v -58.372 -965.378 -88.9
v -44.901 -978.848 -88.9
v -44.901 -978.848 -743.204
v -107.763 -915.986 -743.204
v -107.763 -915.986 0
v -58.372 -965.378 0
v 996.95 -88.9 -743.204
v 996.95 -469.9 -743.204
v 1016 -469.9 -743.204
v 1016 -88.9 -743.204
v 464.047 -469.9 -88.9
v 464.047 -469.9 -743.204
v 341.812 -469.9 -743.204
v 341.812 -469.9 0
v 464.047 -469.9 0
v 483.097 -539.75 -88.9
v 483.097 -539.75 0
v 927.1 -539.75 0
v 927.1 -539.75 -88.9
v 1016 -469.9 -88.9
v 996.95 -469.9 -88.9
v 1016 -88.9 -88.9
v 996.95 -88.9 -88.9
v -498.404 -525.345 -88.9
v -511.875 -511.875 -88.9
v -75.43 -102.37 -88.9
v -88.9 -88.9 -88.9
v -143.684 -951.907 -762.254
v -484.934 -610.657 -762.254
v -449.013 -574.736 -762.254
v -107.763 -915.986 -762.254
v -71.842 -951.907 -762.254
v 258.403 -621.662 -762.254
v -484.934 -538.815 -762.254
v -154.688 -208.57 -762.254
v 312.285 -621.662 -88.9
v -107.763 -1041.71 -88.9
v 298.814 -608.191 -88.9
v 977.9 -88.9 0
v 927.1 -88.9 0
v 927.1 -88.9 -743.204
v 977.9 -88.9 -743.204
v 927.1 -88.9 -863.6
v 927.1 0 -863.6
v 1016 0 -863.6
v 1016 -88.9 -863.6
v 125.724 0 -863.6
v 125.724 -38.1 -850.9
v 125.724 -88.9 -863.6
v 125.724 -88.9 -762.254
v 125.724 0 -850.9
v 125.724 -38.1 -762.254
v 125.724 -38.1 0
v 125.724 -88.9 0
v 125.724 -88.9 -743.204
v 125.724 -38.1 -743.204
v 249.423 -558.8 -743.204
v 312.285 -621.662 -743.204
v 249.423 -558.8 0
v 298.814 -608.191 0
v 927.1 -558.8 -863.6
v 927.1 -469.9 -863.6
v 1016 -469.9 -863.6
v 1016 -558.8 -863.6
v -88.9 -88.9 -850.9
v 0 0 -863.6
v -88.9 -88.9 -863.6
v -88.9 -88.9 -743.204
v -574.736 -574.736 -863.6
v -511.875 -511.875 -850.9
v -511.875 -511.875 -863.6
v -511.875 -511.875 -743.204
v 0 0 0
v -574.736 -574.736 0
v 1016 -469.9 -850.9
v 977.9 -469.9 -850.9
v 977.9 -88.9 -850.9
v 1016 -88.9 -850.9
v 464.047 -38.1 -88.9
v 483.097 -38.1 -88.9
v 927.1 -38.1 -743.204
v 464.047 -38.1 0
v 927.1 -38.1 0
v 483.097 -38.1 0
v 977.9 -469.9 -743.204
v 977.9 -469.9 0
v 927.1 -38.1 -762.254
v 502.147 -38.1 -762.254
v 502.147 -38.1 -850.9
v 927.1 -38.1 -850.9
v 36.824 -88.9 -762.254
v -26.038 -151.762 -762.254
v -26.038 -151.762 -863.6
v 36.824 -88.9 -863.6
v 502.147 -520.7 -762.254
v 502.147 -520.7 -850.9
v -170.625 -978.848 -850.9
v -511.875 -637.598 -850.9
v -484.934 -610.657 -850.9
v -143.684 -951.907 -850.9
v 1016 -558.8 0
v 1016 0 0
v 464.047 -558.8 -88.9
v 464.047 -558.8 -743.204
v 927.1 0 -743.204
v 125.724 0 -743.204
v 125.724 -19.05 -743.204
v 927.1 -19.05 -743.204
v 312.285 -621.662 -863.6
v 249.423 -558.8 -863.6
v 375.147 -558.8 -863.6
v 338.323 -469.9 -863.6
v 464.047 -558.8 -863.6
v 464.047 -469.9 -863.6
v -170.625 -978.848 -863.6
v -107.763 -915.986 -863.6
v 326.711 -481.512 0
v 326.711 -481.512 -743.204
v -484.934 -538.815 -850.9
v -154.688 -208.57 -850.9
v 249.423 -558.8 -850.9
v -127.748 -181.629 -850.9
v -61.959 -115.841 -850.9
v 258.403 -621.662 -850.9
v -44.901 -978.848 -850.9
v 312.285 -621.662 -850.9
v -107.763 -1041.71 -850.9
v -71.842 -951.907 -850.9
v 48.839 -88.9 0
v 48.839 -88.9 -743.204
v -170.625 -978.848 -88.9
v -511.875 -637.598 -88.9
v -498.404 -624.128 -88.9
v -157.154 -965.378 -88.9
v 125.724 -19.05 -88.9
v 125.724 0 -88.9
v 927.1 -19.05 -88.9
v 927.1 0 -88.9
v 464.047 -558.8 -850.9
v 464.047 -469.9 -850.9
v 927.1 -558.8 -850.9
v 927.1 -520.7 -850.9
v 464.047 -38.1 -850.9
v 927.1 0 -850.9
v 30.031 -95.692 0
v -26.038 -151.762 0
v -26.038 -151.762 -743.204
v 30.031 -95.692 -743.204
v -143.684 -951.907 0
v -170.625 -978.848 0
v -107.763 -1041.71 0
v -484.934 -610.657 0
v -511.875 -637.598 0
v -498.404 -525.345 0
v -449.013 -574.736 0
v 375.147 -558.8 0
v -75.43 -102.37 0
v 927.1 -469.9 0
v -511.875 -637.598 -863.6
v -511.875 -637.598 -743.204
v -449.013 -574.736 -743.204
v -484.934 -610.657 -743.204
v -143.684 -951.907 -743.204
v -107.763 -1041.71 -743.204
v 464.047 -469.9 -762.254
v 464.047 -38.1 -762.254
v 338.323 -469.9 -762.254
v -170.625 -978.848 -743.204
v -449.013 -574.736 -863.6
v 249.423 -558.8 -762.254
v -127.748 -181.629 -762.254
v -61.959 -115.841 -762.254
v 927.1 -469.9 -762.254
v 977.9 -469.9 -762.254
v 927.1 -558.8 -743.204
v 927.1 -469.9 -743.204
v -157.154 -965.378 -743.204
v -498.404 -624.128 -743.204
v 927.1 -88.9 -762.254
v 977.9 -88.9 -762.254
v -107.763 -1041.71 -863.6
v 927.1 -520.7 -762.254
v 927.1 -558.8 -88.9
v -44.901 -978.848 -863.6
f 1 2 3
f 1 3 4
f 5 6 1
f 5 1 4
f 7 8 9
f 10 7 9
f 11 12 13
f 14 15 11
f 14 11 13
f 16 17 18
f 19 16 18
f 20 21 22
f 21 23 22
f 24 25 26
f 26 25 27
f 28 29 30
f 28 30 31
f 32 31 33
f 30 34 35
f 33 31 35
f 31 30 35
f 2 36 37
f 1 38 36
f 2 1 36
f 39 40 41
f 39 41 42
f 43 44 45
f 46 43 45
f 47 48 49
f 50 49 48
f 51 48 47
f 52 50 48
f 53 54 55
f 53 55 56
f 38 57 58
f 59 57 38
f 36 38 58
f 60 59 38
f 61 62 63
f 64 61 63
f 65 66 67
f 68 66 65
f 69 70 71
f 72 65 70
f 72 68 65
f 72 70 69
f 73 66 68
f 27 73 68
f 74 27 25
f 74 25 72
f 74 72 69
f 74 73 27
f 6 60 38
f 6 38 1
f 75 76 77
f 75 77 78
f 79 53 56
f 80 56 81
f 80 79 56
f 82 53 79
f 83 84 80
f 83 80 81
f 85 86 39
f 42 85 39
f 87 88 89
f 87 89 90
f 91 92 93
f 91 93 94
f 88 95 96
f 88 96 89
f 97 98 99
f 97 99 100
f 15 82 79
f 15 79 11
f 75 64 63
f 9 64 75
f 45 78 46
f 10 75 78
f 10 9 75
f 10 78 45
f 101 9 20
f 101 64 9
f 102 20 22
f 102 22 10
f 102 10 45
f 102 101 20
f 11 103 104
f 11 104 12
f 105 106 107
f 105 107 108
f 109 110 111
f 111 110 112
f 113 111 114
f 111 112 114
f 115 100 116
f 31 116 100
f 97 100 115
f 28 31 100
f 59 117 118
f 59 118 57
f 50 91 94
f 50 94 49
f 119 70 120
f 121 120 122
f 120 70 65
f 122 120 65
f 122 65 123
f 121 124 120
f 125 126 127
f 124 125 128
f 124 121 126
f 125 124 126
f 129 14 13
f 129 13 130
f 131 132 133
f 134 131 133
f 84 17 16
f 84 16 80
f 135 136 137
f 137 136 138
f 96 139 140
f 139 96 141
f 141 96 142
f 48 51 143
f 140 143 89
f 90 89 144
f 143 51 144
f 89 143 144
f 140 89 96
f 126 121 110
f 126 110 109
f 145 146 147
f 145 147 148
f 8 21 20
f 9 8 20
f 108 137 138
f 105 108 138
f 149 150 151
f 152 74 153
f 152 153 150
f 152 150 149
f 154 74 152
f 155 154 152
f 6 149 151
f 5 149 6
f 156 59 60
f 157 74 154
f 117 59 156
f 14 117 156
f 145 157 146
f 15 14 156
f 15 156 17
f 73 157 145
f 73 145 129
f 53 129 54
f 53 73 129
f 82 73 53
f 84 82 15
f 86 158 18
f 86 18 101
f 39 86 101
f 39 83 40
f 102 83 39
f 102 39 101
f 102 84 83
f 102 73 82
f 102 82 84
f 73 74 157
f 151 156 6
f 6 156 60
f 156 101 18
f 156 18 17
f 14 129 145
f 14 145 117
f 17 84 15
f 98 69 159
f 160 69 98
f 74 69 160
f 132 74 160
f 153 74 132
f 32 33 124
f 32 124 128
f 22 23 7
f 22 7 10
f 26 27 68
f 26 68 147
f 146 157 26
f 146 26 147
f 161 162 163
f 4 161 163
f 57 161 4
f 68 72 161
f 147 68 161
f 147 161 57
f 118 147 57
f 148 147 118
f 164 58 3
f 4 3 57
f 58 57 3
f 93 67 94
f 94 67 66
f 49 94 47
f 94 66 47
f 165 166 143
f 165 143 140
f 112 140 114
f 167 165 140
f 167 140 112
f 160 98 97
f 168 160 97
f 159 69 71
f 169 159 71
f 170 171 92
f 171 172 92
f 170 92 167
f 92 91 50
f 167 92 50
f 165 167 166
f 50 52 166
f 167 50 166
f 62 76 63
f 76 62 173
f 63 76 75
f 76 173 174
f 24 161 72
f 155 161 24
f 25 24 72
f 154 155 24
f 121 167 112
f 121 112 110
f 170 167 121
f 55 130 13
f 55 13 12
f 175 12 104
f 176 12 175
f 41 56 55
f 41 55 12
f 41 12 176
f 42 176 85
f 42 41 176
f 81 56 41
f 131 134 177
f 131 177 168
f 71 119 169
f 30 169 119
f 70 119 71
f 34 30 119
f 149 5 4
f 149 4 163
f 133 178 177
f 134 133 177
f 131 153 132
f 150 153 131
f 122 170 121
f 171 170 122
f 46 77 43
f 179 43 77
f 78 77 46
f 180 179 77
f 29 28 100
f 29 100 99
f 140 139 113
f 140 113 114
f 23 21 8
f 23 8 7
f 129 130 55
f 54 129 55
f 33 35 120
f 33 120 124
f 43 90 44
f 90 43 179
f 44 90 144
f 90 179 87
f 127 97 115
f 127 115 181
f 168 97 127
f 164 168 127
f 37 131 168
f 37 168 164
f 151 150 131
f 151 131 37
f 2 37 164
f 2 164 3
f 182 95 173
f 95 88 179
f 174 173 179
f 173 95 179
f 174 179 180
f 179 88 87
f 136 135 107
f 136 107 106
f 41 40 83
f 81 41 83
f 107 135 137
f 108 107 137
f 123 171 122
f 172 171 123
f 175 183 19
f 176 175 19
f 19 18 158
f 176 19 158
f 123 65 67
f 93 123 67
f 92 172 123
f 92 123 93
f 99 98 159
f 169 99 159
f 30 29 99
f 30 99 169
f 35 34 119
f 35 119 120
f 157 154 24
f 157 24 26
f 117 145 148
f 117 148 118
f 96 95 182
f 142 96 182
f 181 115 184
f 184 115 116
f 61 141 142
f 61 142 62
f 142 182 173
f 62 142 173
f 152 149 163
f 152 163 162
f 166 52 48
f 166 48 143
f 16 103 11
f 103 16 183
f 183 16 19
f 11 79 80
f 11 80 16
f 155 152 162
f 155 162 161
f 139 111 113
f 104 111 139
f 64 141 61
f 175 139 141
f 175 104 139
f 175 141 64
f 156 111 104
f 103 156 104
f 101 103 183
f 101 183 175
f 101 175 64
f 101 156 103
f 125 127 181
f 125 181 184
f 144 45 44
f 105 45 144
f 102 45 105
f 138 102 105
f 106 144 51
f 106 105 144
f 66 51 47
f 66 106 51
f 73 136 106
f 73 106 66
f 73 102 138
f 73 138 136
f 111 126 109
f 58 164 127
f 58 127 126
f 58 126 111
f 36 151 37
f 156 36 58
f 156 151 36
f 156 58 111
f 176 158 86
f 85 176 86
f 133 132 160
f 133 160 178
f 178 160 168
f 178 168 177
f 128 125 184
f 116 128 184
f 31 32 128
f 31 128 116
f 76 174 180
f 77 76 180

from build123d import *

# Parameters (mm, degrees)
F0_W          = 88.9
F0_H          = 88.9
F1_DEPTH      = 863.6
F2_W          = 513.853363
F2_H          = 520.7
F3_DEPTH      = 88.9
F6_W          = 475.753363
F6_H          = 482.6
F7_DEPTH      = 88.9
F9_DEPTH      = 18.796
F9_DEPTH_BACK = 0.254
F10_W         = 801.376414
F10_H         = 19.05
F10_W_2       = 19.05
F10_H_2       = 381
F11_DEPTH     = 743.204


with BuildPart() as f1:
    # F0 (on Top) → F1 (new body)
    with BuildSketch(Plane.XY):
        Polygon((-26.038207, -26.038207), (-88.9, -88.9), (-26.038207, -151.761793), (36.823586, -88.9), (125.723586, -88.9), (125.723586, 0), (36.823586, 0), (0, 0), align=None)
        with Locations((971.55, -44.45)):
            Rectangle(F0_W, F0_H)
        Polygon((-511.874599, -511.874599), (-574.736392, -574.736392), (-511.874599, -637.598185), (-449.012806, -574.736392), align=None)
        Polygon((-170.624866, -978.847917), (-107.763073, -1041.70971), (-44.901281, -978.847917), (-107.763073, -915.986124), align=None)
        Polygon((312.284844, -621.661793), (375.146637, -558.8), (464.046637, -558.8), (464.046637, -469.9), (375.146637, -469.9), (338.323051, -469.9), (312.284844, -495.938207), (249.423051, -558.8), align=None)
        with Locations((971.55, -514.35)):
            Rectangle(F0_W, F0_H)
    extrude(amount=-F1_DEPTH)


with BuildPart() as f3:
    # F2 (on Top) → F3 (new body)
    with BuildSketch(Plane.XY):
        Polygon((1016, 0), (0, 0), (-574.736392, -574.736392), (-107.763073, -1041.70971), (375.146637, -558.8), (1016, -558.8), align=None)
        Polygon((367.255868, -539.75), (-107.763073, -1014.768942), (-547.795623, -574.736392), (7.890768, -19.05), (464.046637, -19.05), (464.046637, -539.75), align=None, mode=Mode.SUBTRACT)
        with Locations((740.023318, -279.4)):
            Rectangle(F2_W, F2_H, mode=Mode.SUBTRACT)
    extrude(amount=-F3_DEPTH)


with BuildPart() as f1_1:
    add(f1.part)

    # F4: union F3
    add(f3.part)

    # F6 (on offset) → F7 (join)
    with BuildSketch(Plane.XY.offset(-762)):
        Polygon((1016, 0), (0, 0), (-574.736392, -574.736392), (-107.763073, -1041.70971), (375.146637, -558.8), (1016, -558.8), align=None)
        Polygon((-107.763073, -987.828173), (-520.854855, -574.736392), (-154.688475, -208.570011), (258.403307, -621.661793), align=None, mode=Mode.SUBTRACT)
        Polygon((-127.747706, -181.629243), (15.781537, -38.1), (464.046637, -38.1), (464.046637, -520.7), (359.3651, -520.7), (285.344075, -594.721024), align=None, mode=Mode.SUBTRACT)
        with Locations((740.023318, -279.4)):
            Rectangle(F6_W, F6_H, mode=Mode.SUBTRACT)
    extrude(amount=-F7_DEPTH)

    # F8 (on face) → F9 (join, two sides)
    with BuildSketch(Plane.XY.offset(-762)) as f9_sk:
        Polygon((-574.736392, -574.736392), (-107.763073, -1041.70971), (375.146637, -558.8), (1016, -558.8), (1016, 0), (0, 0), align=None)
    extrude(amount=F9_DEPTH)
    extrude(f9_sk.sketch, amount=-F9_DEPTH_BACK)

    # F10 (on Top) → F11 (join, through all)
    with BuildSketch(Plane.XY):
        with Locations((526.411793, -28.575)):
            Rectangle(F10_W, F10_H)
        with Locations((987.425, -279.4)):
            Rectangle(F10_W_2, F10_H_2)
        Polygon((44.374324, -83.093798), (29.272848, -94.706202), (326.710647, -481.512404), (341.812123, -469.9), align=None)
        Polygon((-484.933831, -610.657416), (-498.404215, -624.1278), (-157.154482, -965.377533), (-143.684098, -951.907149), align=None)
    extrude(amount=-F11_DEPTH)


solid = f1_1.part
